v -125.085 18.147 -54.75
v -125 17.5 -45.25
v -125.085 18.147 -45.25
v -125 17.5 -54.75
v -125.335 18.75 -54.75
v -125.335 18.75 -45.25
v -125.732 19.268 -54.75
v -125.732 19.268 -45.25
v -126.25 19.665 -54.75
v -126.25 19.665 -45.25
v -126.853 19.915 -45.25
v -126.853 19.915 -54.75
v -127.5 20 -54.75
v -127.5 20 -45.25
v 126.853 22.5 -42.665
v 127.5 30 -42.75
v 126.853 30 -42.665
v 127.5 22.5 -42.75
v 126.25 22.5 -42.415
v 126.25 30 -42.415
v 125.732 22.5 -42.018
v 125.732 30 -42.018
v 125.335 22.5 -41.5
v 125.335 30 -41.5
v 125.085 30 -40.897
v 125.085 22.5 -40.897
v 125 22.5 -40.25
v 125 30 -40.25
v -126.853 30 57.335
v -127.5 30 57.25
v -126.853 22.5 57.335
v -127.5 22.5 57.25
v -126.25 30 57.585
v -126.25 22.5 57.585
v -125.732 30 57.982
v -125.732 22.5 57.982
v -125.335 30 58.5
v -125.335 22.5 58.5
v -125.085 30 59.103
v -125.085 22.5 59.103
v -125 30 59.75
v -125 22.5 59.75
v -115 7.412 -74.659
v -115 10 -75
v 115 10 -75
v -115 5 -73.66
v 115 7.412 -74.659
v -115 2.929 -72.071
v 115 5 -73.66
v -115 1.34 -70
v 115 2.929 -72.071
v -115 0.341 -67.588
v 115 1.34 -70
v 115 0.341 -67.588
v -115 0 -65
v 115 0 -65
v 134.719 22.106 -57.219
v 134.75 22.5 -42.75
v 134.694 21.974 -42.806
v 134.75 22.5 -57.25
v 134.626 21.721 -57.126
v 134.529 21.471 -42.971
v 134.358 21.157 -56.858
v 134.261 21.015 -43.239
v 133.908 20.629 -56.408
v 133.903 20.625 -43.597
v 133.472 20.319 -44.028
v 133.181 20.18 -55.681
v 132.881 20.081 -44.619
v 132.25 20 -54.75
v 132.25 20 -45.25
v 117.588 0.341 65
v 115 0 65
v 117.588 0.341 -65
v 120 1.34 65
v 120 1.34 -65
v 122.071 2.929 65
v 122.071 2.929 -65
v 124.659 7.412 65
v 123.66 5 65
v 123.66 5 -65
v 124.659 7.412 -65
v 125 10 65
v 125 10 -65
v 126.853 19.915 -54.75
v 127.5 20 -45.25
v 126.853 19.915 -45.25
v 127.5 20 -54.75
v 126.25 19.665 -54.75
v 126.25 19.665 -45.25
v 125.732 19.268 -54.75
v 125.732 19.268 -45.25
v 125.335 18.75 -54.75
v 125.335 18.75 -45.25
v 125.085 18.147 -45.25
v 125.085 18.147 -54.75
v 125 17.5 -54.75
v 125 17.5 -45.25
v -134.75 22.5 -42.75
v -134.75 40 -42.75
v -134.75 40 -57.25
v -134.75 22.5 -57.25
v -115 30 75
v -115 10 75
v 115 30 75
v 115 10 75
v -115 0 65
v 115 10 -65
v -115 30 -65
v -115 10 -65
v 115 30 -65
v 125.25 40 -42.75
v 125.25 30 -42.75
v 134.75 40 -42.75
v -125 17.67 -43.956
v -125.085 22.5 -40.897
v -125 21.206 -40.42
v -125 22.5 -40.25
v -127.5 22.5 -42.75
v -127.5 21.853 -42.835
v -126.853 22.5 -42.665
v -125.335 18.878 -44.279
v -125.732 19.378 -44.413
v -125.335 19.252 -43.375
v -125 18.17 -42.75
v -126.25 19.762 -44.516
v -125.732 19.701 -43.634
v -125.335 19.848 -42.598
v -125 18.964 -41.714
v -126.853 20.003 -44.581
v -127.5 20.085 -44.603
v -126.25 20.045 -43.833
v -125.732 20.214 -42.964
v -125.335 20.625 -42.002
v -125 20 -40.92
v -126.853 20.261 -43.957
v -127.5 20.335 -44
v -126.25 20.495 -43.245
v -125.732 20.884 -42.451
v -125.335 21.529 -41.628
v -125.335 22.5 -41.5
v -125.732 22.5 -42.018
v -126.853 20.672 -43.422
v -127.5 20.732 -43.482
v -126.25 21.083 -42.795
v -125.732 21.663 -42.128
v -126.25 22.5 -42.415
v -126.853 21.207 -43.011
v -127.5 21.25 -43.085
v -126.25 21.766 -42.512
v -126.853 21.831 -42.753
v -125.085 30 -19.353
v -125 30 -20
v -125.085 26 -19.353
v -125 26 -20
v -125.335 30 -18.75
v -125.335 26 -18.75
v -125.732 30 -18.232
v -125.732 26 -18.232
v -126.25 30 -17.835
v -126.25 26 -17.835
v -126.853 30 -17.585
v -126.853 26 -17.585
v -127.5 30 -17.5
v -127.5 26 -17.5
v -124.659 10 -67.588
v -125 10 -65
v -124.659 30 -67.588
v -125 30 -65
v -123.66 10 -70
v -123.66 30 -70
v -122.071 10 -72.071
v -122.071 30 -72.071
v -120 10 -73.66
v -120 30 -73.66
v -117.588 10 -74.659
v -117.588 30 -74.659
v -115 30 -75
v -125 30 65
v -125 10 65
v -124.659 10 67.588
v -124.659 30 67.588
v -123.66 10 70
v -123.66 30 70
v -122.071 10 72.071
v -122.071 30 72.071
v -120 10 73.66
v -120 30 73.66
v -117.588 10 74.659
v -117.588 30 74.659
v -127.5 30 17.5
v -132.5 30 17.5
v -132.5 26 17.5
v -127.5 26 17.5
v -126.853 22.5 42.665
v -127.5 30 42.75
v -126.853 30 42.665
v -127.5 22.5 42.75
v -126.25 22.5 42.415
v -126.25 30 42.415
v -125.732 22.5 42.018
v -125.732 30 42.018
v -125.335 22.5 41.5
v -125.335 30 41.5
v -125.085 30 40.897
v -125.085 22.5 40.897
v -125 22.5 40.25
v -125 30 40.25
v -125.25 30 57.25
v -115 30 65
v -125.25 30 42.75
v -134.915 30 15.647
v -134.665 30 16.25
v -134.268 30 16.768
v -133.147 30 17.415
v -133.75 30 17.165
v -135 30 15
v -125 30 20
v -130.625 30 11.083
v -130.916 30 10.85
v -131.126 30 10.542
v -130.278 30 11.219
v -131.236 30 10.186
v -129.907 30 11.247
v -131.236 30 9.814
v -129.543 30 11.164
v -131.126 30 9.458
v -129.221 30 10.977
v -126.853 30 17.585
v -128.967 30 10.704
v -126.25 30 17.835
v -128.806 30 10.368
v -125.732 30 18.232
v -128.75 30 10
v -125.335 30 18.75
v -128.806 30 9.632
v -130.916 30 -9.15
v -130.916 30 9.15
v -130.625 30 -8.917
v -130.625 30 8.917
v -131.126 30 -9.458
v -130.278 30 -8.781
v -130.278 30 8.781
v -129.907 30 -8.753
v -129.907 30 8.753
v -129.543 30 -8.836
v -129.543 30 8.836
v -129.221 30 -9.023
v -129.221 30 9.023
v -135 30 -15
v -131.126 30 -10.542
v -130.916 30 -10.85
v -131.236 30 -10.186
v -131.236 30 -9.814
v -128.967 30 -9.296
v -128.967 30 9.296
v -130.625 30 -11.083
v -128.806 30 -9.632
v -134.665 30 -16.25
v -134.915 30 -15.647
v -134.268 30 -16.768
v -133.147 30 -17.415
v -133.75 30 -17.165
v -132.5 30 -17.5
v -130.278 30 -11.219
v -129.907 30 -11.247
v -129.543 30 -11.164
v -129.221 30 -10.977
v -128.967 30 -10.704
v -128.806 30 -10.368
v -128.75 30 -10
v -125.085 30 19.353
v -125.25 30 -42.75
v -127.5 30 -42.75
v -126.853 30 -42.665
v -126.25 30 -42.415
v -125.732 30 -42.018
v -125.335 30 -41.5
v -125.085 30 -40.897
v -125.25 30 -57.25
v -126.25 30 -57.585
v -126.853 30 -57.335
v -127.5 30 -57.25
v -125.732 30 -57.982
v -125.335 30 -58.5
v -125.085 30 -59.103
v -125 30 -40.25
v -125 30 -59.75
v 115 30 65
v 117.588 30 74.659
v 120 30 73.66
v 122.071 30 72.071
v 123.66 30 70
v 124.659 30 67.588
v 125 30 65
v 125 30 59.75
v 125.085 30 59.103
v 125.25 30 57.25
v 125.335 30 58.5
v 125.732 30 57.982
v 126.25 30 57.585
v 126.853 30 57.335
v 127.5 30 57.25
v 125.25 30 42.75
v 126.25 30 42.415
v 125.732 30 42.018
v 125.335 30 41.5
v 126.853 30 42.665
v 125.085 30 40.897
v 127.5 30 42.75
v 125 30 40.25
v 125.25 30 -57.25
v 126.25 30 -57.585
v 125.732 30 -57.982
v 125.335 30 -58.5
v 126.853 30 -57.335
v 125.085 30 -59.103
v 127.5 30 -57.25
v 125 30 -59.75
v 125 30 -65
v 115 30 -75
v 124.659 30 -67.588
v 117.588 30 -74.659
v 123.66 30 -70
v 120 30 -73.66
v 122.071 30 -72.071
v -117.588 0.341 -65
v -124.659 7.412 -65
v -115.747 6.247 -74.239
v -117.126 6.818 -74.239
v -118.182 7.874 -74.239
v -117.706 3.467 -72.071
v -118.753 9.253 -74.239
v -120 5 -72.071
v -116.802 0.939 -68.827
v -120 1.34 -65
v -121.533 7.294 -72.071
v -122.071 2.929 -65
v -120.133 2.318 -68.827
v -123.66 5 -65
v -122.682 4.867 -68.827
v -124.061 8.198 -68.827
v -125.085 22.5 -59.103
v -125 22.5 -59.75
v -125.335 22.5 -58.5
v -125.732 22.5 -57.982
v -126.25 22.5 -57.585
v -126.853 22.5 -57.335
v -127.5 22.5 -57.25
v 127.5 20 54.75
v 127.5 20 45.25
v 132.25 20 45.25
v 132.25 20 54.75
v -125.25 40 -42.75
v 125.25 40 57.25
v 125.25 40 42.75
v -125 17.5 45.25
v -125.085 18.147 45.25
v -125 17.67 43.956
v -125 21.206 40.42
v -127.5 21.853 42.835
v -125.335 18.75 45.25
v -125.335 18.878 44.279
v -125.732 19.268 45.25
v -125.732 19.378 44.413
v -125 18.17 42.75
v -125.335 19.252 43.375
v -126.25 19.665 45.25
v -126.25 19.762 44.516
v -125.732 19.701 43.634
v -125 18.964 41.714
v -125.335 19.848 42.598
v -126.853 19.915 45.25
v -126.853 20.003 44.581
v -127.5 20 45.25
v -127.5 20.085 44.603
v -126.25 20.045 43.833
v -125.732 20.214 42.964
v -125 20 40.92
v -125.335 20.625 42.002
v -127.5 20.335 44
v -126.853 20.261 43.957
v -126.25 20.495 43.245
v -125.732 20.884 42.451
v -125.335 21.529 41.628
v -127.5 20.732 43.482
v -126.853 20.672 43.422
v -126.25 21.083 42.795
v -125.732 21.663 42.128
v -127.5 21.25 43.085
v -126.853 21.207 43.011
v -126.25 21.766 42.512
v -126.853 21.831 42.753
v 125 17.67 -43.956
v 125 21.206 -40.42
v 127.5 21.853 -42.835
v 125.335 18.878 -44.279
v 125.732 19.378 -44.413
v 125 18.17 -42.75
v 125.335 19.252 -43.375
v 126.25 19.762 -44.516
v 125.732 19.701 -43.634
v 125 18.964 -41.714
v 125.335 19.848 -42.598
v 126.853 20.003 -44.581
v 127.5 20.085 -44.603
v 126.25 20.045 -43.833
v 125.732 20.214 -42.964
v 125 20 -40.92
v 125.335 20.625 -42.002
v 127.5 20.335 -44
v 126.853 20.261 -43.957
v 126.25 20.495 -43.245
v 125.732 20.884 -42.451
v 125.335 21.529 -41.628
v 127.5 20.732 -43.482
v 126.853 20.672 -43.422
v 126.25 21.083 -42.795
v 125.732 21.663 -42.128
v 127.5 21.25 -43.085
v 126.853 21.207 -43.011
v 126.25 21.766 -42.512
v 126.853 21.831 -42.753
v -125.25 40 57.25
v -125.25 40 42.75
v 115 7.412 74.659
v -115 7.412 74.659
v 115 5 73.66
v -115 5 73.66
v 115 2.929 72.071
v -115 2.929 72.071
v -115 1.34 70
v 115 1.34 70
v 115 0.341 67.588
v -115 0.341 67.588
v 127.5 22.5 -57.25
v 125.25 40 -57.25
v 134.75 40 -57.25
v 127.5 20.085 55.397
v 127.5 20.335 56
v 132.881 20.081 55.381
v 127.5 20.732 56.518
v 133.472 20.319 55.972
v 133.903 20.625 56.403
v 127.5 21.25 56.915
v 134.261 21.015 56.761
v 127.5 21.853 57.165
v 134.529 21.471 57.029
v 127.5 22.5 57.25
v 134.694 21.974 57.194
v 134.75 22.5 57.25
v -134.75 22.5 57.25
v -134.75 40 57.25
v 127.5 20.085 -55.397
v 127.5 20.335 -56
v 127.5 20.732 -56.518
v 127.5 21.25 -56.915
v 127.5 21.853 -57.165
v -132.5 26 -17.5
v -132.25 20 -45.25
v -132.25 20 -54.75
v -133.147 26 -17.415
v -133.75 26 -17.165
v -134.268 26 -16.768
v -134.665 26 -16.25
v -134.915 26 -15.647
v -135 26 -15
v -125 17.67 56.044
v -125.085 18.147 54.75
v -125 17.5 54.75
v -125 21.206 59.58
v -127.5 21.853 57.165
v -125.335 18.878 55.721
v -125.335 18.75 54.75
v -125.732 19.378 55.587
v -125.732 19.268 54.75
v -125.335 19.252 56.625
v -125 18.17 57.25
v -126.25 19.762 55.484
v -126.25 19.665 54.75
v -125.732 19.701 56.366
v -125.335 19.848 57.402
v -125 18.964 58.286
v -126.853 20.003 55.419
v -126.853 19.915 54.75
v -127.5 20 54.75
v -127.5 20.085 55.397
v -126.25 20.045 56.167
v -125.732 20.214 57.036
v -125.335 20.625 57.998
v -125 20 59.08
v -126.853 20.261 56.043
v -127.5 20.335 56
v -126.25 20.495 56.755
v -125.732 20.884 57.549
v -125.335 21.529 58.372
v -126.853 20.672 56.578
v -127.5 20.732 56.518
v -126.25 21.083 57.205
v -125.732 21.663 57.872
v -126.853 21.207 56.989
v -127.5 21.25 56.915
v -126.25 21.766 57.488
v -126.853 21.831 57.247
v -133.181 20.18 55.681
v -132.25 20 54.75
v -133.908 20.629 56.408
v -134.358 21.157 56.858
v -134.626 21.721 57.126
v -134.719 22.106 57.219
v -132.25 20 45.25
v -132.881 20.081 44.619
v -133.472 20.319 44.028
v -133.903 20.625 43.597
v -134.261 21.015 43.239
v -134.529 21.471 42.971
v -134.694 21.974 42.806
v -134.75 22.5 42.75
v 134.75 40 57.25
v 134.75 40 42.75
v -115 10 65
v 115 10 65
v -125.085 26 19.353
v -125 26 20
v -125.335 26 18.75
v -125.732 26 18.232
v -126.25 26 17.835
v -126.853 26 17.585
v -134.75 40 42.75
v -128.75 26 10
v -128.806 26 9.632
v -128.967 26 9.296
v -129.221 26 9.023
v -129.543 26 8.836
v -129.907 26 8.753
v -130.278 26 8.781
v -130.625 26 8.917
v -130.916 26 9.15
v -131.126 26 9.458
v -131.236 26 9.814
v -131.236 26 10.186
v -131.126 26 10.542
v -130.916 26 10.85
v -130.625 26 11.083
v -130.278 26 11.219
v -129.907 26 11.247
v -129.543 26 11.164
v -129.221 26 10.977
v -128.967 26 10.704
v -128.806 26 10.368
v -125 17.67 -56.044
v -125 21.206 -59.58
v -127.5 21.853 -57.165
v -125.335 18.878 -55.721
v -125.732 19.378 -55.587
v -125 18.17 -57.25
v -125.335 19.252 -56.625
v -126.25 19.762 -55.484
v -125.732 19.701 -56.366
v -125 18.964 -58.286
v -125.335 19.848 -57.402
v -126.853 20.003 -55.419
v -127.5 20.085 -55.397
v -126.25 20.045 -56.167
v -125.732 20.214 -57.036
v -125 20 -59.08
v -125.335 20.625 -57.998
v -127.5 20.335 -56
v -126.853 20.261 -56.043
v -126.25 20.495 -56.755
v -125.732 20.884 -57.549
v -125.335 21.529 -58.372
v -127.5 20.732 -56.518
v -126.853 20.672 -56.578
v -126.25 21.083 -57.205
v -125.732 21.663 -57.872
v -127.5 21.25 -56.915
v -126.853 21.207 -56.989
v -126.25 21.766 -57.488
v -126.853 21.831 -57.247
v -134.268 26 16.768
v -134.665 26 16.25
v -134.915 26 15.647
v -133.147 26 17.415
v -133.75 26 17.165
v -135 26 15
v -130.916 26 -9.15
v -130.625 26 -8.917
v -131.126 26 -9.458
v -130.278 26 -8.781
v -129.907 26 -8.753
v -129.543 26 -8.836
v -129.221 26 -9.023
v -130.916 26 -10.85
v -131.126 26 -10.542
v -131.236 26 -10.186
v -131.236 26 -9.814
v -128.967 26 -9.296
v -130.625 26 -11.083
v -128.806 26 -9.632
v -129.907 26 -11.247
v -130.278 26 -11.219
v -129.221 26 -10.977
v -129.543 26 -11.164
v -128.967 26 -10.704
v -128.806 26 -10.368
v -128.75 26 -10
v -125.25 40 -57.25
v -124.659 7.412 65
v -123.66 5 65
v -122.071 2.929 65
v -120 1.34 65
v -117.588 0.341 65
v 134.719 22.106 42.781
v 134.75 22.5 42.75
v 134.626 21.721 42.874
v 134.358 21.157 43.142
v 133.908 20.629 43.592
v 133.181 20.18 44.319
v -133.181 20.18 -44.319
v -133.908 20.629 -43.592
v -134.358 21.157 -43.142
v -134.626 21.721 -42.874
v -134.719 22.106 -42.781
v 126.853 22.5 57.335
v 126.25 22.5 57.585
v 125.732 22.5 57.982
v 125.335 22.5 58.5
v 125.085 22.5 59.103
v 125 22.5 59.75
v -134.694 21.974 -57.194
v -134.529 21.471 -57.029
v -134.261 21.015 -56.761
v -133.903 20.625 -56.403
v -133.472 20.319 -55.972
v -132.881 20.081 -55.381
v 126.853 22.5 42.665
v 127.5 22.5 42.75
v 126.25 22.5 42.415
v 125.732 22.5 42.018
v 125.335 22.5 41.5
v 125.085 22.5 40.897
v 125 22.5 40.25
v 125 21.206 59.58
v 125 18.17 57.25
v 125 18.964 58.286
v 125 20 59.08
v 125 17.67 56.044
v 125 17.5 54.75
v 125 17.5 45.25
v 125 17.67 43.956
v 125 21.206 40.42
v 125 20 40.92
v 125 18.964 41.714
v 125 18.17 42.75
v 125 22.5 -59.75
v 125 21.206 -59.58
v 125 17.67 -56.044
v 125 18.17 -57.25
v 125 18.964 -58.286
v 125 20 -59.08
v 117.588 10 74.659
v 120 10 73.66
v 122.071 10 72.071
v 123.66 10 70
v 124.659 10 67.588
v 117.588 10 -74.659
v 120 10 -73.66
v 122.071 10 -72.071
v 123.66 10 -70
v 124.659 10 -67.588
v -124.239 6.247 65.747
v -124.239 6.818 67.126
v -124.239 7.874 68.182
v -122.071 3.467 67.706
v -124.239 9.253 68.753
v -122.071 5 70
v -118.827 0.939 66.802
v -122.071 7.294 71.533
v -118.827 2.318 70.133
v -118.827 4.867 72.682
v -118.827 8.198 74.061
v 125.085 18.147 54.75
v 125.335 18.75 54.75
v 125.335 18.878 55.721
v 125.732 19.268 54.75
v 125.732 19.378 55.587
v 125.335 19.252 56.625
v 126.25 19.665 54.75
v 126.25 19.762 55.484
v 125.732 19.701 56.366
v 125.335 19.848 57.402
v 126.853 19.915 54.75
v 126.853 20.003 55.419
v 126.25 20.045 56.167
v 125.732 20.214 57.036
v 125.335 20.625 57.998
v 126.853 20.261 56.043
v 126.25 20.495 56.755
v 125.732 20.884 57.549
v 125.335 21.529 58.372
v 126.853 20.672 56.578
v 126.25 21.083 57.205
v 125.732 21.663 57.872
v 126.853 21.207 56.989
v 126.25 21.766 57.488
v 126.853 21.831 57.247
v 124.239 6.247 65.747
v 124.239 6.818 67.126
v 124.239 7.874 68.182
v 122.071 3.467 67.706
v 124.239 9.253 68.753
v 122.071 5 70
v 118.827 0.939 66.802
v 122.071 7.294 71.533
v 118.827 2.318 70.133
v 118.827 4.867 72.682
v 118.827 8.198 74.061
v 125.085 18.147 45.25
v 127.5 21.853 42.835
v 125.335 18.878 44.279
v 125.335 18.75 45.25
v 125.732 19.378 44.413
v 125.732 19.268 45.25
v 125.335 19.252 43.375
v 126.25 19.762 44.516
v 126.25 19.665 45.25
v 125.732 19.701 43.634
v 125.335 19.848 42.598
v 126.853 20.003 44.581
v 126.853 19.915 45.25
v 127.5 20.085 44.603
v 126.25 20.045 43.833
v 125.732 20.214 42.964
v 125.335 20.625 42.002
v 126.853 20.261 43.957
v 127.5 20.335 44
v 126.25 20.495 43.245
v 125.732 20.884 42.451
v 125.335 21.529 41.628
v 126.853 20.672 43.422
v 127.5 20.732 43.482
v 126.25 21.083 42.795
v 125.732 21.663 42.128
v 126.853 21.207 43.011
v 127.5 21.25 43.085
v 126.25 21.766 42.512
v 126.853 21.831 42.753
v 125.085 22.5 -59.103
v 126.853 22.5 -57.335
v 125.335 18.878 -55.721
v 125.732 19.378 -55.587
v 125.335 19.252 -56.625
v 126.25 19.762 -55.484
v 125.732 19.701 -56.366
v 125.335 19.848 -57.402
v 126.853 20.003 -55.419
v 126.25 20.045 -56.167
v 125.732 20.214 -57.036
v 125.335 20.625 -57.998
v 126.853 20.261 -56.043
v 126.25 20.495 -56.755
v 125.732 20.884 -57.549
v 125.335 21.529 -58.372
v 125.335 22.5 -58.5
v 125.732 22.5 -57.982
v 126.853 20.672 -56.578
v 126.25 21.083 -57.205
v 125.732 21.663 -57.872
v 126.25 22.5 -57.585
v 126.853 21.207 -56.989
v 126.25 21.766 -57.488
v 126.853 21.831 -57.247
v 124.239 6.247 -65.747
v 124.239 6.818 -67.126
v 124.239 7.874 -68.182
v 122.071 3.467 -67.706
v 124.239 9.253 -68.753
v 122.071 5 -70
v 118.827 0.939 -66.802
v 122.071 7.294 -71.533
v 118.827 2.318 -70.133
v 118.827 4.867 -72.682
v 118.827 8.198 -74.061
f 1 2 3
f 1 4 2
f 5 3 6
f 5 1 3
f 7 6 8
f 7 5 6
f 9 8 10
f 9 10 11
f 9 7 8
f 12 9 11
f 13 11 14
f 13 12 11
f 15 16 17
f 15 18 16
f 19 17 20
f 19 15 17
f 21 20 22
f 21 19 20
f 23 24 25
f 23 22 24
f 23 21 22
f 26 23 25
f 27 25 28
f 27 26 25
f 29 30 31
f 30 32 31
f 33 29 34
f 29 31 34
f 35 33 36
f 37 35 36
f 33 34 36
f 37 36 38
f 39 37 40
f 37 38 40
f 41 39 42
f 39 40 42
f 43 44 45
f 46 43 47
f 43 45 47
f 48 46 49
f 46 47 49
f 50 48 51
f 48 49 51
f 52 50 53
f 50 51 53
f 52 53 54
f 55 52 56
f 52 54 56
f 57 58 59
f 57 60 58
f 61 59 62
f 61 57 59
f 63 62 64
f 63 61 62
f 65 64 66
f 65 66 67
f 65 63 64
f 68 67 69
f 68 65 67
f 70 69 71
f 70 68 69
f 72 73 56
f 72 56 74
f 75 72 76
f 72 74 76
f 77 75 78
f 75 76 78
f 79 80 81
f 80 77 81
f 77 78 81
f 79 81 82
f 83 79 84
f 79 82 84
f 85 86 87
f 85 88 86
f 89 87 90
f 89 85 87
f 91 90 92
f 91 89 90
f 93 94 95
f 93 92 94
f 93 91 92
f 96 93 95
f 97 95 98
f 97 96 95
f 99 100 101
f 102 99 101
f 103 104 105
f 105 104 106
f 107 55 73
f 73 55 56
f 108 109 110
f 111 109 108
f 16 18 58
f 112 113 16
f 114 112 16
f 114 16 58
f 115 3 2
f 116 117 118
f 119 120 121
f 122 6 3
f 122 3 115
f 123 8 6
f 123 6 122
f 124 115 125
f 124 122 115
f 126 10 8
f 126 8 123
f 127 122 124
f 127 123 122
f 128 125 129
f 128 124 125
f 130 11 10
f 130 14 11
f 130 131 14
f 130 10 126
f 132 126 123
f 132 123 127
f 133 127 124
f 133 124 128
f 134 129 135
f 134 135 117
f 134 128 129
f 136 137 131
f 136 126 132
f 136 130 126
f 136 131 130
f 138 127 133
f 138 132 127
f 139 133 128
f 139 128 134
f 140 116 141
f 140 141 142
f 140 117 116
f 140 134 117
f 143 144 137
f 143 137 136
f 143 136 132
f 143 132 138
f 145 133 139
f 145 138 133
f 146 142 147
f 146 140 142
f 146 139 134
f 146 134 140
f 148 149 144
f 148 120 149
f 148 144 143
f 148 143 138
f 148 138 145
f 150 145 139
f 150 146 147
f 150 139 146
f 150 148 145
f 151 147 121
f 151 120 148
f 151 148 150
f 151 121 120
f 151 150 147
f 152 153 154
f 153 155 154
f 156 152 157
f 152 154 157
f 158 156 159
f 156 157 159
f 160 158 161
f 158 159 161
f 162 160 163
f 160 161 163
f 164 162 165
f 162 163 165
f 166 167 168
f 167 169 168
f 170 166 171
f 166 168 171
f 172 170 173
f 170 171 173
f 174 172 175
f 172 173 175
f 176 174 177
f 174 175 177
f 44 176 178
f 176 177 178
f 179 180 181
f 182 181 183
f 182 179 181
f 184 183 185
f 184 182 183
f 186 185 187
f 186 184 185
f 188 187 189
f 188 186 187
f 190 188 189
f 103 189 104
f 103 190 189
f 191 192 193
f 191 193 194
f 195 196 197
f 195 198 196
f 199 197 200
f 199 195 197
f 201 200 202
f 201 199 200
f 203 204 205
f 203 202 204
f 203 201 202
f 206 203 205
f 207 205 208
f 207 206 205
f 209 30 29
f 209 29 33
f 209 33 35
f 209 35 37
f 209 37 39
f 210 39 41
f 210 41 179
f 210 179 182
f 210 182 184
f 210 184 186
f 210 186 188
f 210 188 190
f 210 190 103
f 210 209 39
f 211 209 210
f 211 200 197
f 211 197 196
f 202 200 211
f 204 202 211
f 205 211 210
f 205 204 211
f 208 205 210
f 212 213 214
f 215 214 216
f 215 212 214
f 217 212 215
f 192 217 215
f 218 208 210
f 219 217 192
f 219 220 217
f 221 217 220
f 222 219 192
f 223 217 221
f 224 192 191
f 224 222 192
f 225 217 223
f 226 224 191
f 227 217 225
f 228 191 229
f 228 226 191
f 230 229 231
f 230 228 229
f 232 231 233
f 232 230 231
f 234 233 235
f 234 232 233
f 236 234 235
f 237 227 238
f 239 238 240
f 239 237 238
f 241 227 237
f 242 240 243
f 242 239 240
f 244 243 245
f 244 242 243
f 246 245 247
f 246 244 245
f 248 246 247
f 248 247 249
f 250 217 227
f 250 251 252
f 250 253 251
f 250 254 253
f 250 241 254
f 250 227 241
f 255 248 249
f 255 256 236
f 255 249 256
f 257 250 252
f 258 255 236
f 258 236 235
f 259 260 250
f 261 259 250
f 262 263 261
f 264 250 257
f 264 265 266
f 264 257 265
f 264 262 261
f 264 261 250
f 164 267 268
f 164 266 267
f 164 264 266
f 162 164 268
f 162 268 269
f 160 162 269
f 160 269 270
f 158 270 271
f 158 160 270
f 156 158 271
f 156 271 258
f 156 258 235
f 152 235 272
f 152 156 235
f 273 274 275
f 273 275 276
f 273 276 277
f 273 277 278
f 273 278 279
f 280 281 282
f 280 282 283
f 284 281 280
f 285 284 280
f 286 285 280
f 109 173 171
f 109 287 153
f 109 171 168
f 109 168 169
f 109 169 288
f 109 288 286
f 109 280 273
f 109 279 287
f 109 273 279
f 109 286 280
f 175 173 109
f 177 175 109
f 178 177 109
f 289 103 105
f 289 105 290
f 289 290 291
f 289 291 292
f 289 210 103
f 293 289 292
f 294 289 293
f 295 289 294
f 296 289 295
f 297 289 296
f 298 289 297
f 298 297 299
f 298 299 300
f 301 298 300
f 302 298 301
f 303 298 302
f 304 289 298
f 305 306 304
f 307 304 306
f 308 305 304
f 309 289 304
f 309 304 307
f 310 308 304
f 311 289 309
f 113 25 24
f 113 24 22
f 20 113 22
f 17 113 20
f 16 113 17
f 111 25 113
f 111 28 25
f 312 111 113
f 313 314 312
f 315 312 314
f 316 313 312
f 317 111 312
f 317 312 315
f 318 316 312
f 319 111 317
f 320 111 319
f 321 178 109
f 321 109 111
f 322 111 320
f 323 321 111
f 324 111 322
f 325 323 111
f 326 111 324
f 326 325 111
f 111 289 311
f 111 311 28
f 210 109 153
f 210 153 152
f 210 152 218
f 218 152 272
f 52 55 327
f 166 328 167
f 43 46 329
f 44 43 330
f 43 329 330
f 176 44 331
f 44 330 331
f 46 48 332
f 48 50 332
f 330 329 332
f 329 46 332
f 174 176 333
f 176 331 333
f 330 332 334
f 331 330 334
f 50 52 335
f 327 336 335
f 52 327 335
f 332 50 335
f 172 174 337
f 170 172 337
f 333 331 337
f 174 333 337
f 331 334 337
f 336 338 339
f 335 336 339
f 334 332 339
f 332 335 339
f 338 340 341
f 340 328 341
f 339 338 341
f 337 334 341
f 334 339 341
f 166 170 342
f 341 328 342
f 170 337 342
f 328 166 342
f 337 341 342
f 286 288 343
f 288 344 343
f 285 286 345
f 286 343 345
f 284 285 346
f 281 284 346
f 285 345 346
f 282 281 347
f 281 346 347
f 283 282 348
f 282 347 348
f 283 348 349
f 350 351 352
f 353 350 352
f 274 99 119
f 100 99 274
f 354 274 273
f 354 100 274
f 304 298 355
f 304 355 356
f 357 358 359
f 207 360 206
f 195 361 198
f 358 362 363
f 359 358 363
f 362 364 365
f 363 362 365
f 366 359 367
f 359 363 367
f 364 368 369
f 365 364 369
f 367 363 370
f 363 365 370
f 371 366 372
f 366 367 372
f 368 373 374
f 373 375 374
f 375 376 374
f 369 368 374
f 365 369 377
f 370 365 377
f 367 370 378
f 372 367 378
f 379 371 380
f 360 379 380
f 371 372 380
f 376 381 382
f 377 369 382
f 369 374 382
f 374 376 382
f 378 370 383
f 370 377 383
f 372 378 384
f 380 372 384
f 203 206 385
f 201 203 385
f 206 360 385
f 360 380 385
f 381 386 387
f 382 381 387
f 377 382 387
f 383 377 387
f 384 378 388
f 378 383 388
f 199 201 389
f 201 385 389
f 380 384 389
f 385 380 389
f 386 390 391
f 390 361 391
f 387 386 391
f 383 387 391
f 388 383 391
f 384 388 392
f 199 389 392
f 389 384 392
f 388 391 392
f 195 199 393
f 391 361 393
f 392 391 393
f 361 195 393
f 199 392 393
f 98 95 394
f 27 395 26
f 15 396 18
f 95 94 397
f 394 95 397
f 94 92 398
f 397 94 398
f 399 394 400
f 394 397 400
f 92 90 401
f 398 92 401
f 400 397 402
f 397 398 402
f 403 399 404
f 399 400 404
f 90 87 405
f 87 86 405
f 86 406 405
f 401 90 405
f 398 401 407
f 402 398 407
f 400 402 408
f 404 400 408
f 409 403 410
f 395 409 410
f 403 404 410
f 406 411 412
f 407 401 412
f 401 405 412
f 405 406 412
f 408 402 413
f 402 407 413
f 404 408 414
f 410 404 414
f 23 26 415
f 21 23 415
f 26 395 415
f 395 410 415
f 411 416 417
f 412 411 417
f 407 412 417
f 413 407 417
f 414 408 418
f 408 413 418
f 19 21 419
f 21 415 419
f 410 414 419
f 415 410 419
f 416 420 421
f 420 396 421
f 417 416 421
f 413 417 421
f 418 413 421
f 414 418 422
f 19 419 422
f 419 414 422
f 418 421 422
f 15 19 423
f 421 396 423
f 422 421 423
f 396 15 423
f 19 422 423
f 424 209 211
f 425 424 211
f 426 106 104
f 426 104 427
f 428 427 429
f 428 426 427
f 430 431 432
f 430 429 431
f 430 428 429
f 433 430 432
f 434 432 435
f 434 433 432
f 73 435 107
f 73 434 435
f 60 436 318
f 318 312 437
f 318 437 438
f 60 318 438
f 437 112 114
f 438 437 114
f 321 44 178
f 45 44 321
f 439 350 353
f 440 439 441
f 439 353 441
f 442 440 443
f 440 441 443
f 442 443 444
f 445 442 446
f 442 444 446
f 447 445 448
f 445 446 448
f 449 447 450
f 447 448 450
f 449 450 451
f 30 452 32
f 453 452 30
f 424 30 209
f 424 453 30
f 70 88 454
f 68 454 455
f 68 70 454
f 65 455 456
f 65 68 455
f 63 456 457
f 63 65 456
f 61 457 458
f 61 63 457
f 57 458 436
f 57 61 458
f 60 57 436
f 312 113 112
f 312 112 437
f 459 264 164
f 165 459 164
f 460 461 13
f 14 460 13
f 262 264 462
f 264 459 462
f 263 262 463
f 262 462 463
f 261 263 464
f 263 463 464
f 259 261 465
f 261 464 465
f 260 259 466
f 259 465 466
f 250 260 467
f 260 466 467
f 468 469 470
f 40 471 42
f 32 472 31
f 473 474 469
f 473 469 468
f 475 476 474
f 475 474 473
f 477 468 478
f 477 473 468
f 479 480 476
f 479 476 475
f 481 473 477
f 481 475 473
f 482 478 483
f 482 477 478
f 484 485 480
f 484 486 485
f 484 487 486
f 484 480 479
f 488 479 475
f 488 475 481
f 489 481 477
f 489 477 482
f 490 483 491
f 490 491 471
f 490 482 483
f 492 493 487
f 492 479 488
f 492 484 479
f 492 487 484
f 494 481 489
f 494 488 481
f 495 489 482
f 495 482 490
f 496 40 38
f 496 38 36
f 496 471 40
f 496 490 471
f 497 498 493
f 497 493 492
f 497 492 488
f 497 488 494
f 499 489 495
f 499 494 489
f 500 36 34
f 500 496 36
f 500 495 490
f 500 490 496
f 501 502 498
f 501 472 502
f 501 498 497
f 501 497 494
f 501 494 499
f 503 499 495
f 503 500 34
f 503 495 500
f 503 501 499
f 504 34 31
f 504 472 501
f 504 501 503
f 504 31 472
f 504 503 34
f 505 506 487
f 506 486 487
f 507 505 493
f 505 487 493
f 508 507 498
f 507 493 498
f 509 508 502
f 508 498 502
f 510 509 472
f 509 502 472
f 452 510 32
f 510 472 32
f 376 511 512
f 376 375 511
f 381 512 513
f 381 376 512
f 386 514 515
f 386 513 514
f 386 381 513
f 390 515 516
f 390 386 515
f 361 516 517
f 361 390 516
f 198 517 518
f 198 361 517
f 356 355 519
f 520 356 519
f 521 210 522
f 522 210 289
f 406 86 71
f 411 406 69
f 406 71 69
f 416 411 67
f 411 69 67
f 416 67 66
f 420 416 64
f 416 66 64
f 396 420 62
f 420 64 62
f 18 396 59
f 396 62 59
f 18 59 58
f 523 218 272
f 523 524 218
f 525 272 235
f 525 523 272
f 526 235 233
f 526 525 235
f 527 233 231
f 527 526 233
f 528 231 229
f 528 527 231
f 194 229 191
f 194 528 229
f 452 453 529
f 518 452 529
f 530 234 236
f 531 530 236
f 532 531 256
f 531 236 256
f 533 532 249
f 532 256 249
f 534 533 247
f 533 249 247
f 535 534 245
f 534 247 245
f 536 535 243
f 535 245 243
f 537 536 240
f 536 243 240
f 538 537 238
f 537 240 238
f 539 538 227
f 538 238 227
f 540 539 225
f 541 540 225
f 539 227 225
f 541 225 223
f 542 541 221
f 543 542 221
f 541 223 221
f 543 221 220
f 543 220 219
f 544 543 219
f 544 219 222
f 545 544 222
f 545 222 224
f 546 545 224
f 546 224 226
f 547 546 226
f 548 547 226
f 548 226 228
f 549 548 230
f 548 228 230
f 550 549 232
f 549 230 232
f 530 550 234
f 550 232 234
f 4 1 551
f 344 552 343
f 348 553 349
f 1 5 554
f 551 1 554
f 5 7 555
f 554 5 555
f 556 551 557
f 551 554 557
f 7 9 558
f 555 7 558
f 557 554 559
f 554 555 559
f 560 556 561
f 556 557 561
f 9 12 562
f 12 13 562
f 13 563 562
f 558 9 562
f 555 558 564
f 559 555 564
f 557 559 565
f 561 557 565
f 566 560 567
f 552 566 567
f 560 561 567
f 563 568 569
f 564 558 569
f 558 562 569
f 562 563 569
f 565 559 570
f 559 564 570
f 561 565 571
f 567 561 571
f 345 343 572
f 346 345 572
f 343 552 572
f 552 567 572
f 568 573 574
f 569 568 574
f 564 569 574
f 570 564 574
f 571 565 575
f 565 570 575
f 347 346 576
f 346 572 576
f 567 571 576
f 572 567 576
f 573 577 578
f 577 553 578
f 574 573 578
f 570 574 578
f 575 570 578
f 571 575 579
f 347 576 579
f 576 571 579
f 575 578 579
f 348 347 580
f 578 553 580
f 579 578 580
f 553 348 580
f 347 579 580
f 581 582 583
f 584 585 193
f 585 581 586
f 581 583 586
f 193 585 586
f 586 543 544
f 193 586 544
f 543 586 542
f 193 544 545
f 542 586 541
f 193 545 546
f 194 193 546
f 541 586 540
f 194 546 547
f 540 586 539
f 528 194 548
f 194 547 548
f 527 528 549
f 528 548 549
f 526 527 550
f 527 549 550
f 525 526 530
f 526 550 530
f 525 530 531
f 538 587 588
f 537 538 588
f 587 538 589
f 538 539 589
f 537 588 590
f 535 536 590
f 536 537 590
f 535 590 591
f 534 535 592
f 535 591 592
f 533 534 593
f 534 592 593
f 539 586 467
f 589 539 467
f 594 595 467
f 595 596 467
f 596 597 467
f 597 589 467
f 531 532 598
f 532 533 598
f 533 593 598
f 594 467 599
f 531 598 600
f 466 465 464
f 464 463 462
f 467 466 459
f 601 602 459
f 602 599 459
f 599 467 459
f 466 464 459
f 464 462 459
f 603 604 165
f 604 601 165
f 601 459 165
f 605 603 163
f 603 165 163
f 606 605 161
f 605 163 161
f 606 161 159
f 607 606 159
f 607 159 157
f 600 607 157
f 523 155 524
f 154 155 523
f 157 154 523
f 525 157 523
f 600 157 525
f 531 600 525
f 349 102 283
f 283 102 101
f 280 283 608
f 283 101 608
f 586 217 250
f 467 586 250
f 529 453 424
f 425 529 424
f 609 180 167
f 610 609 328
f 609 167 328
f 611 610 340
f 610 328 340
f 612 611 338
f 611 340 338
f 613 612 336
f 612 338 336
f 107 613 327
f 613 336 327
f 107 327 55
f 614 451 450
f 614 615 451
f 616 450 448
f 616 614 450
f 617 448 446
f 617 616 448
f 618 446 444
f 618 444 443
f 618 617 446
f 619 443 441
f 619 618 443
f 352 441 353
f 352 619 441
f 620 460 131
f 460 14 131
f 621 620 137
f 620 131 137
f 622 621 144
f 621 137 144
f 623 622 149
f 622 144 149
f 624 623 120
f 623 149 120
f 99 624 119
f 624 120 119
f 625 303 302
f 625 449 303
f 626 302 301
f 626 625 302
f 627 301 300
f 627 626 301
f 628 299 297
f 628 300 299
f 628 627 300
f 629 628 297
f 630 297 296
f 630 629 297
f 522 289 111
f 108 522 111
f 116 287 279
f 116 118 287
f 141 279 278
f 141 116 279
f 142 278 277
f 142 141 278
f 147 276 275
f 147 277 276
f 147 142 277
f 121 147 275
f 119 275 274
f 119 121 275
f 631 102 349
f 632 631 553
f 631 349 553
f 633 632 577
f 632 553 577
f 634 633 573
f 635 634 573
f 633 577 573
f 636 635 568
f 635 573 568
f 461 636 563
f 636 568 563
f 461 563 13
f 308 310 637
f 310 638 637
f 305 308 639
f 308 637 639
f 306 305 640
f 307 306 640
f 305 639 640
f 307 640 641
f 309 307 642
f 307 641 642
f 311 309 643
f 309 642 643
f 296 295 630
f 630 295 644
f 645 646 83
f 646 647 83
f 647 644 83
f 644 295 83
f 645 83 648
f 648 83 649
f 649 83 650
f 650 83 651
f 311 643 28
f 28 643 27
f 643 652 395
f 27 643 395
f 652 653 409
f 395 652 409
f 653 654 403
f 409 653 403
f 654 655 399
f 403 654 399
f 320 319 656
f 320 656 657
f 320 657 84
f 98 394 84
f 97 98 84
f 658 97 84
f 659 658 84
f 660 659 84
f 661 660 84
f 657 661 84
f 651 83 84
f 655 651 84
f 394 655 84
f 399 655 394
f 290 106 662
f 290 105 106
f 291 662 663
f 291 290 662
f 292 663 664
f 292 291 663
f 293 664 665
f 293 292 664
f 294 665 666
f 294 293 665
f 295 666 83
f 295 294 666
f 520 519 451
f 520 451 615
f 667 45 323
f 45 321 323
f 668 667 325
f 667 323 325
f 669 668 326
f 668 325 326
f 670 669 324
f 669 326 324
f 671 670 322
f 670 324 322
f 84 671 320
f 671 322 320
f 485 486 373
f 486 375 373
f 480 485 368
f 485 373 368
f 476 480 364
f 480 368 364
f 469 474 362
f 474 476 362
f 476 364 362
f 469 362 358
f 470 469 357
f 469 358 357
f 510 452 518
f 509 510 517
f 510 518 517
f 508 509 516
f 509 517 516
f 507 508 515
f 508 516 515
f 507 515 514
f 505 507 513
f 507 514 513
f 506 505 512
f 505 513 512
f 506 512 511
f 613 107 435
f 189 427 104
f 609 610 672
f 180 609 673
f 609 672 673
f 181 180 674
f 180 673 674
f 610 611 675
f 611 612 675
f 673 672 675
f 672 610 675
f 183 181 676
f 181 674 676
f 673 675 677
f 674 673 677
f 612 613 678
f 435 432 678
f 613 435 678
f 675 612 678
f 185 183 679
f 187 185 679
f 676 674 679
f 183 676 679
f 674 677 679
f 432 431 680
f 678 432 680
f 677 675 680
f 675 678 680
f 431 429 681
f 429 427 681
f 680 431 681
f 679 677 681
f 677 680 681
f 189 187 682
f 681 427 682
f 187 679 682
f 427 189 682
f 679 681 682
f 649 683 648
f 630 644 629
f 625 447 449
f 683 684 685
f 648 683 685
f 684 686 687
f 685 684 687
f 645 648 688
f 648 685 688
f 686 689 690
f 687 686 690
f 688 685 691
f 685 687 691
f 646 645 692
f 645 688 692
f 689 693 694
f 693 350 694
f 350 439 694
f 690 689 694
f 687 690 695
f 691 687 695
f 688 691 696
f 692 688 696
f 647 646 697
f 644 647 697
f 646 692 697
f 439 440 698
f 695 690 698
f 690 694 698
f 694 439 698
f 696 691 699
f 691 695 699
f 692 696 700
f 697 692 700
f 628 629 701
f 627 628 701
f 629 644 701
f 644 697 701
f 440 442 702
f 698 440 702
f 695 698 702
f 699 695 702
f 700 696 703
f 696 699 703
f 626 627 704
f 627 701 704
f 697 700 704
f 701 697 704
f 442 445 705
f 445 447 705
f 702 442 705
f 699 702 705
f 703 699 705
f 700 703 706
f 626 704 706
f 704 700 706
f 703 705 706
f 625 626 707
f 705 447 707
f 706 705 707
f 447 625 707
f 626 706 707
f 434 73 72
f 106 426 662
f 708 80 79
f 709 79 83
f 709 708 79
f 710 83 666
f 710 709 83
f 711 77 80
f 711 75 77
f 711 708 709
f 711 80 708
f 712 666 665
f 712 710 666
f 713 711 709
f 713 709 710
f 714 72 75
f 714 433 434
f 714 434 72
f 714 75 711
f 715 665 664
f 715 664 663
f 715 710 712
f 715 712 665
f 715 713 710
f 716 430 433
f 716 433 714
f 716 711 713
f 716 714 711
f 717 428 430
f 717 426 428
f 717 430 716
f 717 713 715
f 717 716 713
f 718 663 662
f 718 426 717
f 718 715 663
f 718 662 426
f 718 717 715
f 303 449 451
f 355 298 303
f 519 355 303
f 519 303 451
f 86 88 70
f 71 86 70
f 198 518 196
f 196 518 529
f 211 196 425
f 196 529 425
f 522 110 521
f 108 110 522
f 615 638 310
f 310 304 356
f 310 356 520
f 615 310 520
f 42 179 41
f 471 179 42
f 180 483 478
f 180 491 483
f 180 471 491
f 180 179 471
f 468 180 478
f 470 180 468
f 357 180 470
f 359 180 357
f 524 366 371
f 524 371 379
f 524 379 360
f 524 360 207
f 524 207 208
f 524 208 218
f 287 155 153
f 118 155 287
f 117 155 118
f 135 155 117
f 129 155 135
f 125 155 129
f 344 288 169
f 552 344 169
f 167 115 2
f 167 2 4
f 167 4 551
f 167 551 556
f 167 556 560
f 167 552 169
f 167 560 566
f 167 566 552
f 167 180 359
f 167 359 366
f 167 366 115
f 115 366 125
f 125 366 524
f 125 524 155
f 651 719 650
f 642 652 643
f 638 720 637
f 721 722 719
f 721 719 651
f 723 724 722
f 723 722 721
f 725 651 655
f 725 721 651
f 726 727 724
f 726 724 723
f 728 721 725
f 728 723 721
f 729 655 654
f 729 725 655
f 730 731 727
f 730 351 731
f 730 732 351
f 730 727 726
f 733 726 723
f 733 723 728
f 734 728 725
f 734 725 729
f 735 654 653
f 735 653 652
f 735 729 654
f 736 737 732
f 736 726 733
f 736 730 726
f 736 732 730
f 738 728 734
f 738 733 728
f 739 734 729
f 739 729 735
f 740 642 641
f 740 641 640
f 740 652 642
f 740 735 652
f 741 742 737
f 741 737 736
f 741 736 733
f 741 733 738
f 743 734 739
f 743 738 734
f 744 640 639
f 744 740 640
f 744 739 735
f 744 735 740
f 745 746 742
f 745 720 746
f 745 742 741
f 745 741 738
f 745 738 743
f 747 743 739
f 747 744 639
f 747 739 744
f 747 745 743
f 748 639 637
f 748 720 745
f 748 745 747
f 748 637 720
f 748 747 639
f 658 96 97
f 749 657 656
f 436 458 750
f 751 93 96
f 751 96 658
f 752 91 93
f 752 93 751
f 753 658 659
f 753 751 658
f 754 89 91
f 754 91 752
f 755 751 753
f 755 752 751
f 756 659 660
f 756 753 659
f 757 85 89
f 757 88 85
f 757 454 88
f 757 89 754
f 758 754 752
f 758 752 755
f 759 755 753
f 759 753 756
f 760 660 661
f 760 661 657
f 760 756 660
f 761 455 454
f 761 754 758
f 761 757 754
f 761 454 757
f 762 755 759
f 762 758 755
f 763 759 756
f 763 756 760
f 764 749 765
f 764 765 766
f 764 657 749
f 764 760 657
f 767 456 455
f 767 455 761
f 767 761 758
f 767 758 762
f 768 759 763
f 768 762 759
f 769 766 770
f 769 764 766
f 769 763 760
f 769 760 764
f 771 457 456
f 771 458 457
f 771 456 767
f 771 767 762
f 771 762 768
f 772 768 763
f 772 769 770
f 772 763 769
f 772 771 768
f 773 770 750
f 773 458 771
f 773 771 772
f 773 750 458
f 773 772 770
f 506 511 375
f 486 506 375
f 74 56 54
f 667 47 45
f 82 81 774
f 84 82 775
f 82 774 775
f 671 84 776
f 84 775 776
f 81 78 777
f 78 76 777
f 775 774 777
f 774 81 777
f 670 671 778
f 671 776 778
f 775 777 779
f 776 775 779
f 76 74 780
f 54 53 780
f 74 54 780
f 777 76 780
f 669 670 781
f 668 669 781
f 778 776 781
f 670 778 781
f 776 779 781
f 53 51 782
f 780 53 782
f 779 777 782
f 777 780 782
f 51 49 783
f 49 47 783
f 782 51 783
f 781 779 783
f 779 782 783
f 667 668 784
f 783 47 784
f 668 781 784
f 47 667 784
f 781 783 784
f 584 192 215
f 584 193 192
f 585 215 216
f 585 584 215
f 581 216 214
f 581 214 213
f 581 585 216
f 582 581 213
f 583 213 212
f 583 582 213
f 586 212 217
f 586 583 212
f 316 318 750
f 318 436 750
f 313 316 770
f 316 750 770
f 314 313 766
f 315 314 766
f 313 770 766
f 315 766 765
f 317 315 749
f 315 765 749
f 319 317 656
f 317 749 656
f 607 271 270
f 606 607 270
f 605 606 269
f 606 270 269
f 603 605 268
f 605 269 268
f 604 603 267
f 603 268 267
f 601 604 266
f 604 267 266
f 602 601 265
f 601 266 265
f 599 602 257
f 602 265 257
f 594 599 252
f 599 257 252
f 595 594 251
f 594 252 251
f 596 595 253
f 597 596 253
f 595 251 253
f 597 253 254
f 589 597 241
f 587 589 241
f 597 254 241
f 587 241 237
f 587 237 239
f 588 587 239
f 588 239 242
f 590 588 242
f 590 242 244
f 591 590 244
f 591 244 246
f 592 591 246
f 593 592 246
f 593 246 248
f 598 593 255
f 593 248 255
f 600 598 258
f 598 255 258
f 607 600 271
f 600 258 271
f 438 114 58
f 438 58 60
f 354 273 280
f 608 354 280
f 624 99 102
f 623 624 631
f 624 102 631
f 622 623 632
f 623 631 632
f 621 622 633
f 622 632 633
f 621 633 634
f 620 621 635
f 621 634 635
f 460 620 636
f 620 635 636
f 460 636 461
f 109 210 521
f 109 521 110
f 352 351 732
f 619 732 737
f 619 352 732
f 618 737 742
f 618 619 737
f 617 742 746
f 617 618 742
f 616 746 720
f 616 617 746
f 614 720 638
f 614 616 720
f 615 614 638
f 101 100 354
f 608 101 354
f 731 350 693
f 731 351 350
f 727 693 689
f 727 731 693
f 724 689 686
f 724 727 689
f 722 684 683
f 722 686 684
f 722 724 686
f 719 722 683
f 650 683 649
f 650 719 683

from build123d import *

# Parameters (mm, degrees)
SKETCH1_W                = 250
SKETCH1_H                = 150
BOSS_EXTRUDE1_DEPTH      = 30
SKETCH2_W                = 230
SKETCH2_H                = 130
CUT_EXTRUDE1_DEPTH       = 20
FILLET1_R                = 10
SKETCH3_W                = 9.75
SKETCH3_H                = 14.5
BOSS_EXTRUDE2_DEPTH      = 10
BOSS_EXTRUDE2_DEPTH_BACK = 10
FILLET3_R                = 2.5
SKETCH4_W                = 250.5
SKETCH4_H                = 135.53043316
CUT_EXTRUDE3_DEPTH       = 36
SKETCH5_W                = 10
SKETCH5_H                = 35
SKETCH5_R                = 1.25
BOSS_EXTRUDE5_DEPTH      = 4
FILLET4_R                = 2.5


with BuildPart() as part:
    # Sketch1 → Boss-Extrude1 (new body)
    with BuildSketch(Plane(origin=(0, 0, 0), x_dir=(1, 0, 0), z_dir=(0, 1, 0))):
        Rectangle(SKETCH1_W, SKETCH1_H)
    extrude(amount=BOSS_EXTRUDE1_DEPTH)

    # Sketch2 → Cut-Extrude1 (cut)
    with BuildSketch(Plane(origin=(0, 30, 0), x_dir=(1, 0, 0), z_dir=(0, 1, 0))):
        Rectangle(SKETCH2_W, SKETCH2_H)
    extrude(amount=-CUT_EXTRUDE1_DEPTH, mode=Mode.SUBTRACT)

    # Fillet1
    fillet1_edges = [part.edges().sort_by_distance(p)[0] for p in [
        (0, 0, 75),
        (-125, 0, 0),
        (0, 0, -75),
        (125, 0, 0),
        (125, 15, 75),
        (-125, 15, 75),
        (-125, 15, -75),
        (125, 15, -75),
    ]]
    fillet(fillet1_edges, radius=FILLET1_R)

    # Sketch3 → Boss-Extrude2 (add, two sides)
    with BuildSketch(Plane(origin=(0, 30, 0), x_dir=(1, 0, 0), z_dir=(0, 1, 0))) as boss_extrude2_sk:
        with Locations((-129.875, 50)):
            Rectangle(SKETCH3_W, SKETCH3_H)
        with Locations((-129.875, -50)):
            Rectangle(SKETCH3_W, SKETCH3_H)
        with Locations((129.875, -50)):
            Rectangle(SKETCH3_W, SKETCH3_H)
        with Locations((129.875, 50)):
            Rectangle(SKETCH3_W, SKETCH3_H)
    extrude(amount=BOSS_EXTRUDE2_DEPTH)
    extrude(boss_extrude2_sk.sketch, amount=-BOSS_EXTRUDE2_DEPTH_BACK)

    # Fillet3
    fillet3_edges = [part.edges().sort_by_distance(p)[0] for p in [
        (125, 20, -50),
        (125, 25, -42.75),
        (125, 25, -57.25),
        (129.875, 20, -57.25),
        (134.75, 20, -50),
        (129.875, 20, -42.75),
        (-125, 20, -50),
        (-125, 25, -57.25),
        (-125, 25, -42.75),
        (-129.875, 20, -42.75),
        (-134.75, 20, -50),
        (-129.875, 20, -57.25),
        (-125, 20, 50),
        (-125, 25, 42.75),
        (-125, 25, 57.25),
        (-129.875, 20, 57.25),
        (-134.75, 20, 50),
        (-129.875, 20, 42.75),
        (125, 20, 50),
        (125, 25, 57.25),
        (125, 25, 42.75),
        (129.875, 20, 42.75),
        (134.75, 20, 50),
        (129.875, 20, 57.25),
    ]]
    fillet(fillet3_edges, radius=FILLET3_R)

    # Sketch4 → Cut-Extrude3 (cut)
    with BuildSketch(Plane(origin=(0, 30, 0), x_dir=(1, 0, 0), z_dir=(0, 1, 0))):
        Rectangle(SKETCH4_W, SKETCH4_H)
    extrude(amount=CUT_EXTRUDE3_DEPTH, mode=Mode.SUBTRACT)

    # Sketch5 → Boss-Extrude5 (add)
    with BuildSketch(Plane(origin=(0, 30, 0), x_dir=(1, 0, 0), z_dir=(0, 1, 0))):
        with Locations((-130, 0)):
            Rectangle(SKETCH5_W, SKETCH5_H)
        with Locations((-130, 10)):
            Circle(SKETCH5_R, mode=Mode.SUBTRACT)
        with Locations((-130, -10)):
            Circle(SKETCH5_R, mode=Mode.SUBTRACT)
    extrude(amount=-BOSS_EXTRUDE5_DEPTH)

    # Fillet4
    fillet4_edges = [part.edges().sort_by_distance(p)[0] for p in [
        (-125, 28, -17.5),
        (-125, 28, 17.5),
        (-135, 28, 17.5),
        (-135, 28, -17.5),
    ]]
    fillet(fillet4_edges, radius=FILLET4_R)


solid = part.part
